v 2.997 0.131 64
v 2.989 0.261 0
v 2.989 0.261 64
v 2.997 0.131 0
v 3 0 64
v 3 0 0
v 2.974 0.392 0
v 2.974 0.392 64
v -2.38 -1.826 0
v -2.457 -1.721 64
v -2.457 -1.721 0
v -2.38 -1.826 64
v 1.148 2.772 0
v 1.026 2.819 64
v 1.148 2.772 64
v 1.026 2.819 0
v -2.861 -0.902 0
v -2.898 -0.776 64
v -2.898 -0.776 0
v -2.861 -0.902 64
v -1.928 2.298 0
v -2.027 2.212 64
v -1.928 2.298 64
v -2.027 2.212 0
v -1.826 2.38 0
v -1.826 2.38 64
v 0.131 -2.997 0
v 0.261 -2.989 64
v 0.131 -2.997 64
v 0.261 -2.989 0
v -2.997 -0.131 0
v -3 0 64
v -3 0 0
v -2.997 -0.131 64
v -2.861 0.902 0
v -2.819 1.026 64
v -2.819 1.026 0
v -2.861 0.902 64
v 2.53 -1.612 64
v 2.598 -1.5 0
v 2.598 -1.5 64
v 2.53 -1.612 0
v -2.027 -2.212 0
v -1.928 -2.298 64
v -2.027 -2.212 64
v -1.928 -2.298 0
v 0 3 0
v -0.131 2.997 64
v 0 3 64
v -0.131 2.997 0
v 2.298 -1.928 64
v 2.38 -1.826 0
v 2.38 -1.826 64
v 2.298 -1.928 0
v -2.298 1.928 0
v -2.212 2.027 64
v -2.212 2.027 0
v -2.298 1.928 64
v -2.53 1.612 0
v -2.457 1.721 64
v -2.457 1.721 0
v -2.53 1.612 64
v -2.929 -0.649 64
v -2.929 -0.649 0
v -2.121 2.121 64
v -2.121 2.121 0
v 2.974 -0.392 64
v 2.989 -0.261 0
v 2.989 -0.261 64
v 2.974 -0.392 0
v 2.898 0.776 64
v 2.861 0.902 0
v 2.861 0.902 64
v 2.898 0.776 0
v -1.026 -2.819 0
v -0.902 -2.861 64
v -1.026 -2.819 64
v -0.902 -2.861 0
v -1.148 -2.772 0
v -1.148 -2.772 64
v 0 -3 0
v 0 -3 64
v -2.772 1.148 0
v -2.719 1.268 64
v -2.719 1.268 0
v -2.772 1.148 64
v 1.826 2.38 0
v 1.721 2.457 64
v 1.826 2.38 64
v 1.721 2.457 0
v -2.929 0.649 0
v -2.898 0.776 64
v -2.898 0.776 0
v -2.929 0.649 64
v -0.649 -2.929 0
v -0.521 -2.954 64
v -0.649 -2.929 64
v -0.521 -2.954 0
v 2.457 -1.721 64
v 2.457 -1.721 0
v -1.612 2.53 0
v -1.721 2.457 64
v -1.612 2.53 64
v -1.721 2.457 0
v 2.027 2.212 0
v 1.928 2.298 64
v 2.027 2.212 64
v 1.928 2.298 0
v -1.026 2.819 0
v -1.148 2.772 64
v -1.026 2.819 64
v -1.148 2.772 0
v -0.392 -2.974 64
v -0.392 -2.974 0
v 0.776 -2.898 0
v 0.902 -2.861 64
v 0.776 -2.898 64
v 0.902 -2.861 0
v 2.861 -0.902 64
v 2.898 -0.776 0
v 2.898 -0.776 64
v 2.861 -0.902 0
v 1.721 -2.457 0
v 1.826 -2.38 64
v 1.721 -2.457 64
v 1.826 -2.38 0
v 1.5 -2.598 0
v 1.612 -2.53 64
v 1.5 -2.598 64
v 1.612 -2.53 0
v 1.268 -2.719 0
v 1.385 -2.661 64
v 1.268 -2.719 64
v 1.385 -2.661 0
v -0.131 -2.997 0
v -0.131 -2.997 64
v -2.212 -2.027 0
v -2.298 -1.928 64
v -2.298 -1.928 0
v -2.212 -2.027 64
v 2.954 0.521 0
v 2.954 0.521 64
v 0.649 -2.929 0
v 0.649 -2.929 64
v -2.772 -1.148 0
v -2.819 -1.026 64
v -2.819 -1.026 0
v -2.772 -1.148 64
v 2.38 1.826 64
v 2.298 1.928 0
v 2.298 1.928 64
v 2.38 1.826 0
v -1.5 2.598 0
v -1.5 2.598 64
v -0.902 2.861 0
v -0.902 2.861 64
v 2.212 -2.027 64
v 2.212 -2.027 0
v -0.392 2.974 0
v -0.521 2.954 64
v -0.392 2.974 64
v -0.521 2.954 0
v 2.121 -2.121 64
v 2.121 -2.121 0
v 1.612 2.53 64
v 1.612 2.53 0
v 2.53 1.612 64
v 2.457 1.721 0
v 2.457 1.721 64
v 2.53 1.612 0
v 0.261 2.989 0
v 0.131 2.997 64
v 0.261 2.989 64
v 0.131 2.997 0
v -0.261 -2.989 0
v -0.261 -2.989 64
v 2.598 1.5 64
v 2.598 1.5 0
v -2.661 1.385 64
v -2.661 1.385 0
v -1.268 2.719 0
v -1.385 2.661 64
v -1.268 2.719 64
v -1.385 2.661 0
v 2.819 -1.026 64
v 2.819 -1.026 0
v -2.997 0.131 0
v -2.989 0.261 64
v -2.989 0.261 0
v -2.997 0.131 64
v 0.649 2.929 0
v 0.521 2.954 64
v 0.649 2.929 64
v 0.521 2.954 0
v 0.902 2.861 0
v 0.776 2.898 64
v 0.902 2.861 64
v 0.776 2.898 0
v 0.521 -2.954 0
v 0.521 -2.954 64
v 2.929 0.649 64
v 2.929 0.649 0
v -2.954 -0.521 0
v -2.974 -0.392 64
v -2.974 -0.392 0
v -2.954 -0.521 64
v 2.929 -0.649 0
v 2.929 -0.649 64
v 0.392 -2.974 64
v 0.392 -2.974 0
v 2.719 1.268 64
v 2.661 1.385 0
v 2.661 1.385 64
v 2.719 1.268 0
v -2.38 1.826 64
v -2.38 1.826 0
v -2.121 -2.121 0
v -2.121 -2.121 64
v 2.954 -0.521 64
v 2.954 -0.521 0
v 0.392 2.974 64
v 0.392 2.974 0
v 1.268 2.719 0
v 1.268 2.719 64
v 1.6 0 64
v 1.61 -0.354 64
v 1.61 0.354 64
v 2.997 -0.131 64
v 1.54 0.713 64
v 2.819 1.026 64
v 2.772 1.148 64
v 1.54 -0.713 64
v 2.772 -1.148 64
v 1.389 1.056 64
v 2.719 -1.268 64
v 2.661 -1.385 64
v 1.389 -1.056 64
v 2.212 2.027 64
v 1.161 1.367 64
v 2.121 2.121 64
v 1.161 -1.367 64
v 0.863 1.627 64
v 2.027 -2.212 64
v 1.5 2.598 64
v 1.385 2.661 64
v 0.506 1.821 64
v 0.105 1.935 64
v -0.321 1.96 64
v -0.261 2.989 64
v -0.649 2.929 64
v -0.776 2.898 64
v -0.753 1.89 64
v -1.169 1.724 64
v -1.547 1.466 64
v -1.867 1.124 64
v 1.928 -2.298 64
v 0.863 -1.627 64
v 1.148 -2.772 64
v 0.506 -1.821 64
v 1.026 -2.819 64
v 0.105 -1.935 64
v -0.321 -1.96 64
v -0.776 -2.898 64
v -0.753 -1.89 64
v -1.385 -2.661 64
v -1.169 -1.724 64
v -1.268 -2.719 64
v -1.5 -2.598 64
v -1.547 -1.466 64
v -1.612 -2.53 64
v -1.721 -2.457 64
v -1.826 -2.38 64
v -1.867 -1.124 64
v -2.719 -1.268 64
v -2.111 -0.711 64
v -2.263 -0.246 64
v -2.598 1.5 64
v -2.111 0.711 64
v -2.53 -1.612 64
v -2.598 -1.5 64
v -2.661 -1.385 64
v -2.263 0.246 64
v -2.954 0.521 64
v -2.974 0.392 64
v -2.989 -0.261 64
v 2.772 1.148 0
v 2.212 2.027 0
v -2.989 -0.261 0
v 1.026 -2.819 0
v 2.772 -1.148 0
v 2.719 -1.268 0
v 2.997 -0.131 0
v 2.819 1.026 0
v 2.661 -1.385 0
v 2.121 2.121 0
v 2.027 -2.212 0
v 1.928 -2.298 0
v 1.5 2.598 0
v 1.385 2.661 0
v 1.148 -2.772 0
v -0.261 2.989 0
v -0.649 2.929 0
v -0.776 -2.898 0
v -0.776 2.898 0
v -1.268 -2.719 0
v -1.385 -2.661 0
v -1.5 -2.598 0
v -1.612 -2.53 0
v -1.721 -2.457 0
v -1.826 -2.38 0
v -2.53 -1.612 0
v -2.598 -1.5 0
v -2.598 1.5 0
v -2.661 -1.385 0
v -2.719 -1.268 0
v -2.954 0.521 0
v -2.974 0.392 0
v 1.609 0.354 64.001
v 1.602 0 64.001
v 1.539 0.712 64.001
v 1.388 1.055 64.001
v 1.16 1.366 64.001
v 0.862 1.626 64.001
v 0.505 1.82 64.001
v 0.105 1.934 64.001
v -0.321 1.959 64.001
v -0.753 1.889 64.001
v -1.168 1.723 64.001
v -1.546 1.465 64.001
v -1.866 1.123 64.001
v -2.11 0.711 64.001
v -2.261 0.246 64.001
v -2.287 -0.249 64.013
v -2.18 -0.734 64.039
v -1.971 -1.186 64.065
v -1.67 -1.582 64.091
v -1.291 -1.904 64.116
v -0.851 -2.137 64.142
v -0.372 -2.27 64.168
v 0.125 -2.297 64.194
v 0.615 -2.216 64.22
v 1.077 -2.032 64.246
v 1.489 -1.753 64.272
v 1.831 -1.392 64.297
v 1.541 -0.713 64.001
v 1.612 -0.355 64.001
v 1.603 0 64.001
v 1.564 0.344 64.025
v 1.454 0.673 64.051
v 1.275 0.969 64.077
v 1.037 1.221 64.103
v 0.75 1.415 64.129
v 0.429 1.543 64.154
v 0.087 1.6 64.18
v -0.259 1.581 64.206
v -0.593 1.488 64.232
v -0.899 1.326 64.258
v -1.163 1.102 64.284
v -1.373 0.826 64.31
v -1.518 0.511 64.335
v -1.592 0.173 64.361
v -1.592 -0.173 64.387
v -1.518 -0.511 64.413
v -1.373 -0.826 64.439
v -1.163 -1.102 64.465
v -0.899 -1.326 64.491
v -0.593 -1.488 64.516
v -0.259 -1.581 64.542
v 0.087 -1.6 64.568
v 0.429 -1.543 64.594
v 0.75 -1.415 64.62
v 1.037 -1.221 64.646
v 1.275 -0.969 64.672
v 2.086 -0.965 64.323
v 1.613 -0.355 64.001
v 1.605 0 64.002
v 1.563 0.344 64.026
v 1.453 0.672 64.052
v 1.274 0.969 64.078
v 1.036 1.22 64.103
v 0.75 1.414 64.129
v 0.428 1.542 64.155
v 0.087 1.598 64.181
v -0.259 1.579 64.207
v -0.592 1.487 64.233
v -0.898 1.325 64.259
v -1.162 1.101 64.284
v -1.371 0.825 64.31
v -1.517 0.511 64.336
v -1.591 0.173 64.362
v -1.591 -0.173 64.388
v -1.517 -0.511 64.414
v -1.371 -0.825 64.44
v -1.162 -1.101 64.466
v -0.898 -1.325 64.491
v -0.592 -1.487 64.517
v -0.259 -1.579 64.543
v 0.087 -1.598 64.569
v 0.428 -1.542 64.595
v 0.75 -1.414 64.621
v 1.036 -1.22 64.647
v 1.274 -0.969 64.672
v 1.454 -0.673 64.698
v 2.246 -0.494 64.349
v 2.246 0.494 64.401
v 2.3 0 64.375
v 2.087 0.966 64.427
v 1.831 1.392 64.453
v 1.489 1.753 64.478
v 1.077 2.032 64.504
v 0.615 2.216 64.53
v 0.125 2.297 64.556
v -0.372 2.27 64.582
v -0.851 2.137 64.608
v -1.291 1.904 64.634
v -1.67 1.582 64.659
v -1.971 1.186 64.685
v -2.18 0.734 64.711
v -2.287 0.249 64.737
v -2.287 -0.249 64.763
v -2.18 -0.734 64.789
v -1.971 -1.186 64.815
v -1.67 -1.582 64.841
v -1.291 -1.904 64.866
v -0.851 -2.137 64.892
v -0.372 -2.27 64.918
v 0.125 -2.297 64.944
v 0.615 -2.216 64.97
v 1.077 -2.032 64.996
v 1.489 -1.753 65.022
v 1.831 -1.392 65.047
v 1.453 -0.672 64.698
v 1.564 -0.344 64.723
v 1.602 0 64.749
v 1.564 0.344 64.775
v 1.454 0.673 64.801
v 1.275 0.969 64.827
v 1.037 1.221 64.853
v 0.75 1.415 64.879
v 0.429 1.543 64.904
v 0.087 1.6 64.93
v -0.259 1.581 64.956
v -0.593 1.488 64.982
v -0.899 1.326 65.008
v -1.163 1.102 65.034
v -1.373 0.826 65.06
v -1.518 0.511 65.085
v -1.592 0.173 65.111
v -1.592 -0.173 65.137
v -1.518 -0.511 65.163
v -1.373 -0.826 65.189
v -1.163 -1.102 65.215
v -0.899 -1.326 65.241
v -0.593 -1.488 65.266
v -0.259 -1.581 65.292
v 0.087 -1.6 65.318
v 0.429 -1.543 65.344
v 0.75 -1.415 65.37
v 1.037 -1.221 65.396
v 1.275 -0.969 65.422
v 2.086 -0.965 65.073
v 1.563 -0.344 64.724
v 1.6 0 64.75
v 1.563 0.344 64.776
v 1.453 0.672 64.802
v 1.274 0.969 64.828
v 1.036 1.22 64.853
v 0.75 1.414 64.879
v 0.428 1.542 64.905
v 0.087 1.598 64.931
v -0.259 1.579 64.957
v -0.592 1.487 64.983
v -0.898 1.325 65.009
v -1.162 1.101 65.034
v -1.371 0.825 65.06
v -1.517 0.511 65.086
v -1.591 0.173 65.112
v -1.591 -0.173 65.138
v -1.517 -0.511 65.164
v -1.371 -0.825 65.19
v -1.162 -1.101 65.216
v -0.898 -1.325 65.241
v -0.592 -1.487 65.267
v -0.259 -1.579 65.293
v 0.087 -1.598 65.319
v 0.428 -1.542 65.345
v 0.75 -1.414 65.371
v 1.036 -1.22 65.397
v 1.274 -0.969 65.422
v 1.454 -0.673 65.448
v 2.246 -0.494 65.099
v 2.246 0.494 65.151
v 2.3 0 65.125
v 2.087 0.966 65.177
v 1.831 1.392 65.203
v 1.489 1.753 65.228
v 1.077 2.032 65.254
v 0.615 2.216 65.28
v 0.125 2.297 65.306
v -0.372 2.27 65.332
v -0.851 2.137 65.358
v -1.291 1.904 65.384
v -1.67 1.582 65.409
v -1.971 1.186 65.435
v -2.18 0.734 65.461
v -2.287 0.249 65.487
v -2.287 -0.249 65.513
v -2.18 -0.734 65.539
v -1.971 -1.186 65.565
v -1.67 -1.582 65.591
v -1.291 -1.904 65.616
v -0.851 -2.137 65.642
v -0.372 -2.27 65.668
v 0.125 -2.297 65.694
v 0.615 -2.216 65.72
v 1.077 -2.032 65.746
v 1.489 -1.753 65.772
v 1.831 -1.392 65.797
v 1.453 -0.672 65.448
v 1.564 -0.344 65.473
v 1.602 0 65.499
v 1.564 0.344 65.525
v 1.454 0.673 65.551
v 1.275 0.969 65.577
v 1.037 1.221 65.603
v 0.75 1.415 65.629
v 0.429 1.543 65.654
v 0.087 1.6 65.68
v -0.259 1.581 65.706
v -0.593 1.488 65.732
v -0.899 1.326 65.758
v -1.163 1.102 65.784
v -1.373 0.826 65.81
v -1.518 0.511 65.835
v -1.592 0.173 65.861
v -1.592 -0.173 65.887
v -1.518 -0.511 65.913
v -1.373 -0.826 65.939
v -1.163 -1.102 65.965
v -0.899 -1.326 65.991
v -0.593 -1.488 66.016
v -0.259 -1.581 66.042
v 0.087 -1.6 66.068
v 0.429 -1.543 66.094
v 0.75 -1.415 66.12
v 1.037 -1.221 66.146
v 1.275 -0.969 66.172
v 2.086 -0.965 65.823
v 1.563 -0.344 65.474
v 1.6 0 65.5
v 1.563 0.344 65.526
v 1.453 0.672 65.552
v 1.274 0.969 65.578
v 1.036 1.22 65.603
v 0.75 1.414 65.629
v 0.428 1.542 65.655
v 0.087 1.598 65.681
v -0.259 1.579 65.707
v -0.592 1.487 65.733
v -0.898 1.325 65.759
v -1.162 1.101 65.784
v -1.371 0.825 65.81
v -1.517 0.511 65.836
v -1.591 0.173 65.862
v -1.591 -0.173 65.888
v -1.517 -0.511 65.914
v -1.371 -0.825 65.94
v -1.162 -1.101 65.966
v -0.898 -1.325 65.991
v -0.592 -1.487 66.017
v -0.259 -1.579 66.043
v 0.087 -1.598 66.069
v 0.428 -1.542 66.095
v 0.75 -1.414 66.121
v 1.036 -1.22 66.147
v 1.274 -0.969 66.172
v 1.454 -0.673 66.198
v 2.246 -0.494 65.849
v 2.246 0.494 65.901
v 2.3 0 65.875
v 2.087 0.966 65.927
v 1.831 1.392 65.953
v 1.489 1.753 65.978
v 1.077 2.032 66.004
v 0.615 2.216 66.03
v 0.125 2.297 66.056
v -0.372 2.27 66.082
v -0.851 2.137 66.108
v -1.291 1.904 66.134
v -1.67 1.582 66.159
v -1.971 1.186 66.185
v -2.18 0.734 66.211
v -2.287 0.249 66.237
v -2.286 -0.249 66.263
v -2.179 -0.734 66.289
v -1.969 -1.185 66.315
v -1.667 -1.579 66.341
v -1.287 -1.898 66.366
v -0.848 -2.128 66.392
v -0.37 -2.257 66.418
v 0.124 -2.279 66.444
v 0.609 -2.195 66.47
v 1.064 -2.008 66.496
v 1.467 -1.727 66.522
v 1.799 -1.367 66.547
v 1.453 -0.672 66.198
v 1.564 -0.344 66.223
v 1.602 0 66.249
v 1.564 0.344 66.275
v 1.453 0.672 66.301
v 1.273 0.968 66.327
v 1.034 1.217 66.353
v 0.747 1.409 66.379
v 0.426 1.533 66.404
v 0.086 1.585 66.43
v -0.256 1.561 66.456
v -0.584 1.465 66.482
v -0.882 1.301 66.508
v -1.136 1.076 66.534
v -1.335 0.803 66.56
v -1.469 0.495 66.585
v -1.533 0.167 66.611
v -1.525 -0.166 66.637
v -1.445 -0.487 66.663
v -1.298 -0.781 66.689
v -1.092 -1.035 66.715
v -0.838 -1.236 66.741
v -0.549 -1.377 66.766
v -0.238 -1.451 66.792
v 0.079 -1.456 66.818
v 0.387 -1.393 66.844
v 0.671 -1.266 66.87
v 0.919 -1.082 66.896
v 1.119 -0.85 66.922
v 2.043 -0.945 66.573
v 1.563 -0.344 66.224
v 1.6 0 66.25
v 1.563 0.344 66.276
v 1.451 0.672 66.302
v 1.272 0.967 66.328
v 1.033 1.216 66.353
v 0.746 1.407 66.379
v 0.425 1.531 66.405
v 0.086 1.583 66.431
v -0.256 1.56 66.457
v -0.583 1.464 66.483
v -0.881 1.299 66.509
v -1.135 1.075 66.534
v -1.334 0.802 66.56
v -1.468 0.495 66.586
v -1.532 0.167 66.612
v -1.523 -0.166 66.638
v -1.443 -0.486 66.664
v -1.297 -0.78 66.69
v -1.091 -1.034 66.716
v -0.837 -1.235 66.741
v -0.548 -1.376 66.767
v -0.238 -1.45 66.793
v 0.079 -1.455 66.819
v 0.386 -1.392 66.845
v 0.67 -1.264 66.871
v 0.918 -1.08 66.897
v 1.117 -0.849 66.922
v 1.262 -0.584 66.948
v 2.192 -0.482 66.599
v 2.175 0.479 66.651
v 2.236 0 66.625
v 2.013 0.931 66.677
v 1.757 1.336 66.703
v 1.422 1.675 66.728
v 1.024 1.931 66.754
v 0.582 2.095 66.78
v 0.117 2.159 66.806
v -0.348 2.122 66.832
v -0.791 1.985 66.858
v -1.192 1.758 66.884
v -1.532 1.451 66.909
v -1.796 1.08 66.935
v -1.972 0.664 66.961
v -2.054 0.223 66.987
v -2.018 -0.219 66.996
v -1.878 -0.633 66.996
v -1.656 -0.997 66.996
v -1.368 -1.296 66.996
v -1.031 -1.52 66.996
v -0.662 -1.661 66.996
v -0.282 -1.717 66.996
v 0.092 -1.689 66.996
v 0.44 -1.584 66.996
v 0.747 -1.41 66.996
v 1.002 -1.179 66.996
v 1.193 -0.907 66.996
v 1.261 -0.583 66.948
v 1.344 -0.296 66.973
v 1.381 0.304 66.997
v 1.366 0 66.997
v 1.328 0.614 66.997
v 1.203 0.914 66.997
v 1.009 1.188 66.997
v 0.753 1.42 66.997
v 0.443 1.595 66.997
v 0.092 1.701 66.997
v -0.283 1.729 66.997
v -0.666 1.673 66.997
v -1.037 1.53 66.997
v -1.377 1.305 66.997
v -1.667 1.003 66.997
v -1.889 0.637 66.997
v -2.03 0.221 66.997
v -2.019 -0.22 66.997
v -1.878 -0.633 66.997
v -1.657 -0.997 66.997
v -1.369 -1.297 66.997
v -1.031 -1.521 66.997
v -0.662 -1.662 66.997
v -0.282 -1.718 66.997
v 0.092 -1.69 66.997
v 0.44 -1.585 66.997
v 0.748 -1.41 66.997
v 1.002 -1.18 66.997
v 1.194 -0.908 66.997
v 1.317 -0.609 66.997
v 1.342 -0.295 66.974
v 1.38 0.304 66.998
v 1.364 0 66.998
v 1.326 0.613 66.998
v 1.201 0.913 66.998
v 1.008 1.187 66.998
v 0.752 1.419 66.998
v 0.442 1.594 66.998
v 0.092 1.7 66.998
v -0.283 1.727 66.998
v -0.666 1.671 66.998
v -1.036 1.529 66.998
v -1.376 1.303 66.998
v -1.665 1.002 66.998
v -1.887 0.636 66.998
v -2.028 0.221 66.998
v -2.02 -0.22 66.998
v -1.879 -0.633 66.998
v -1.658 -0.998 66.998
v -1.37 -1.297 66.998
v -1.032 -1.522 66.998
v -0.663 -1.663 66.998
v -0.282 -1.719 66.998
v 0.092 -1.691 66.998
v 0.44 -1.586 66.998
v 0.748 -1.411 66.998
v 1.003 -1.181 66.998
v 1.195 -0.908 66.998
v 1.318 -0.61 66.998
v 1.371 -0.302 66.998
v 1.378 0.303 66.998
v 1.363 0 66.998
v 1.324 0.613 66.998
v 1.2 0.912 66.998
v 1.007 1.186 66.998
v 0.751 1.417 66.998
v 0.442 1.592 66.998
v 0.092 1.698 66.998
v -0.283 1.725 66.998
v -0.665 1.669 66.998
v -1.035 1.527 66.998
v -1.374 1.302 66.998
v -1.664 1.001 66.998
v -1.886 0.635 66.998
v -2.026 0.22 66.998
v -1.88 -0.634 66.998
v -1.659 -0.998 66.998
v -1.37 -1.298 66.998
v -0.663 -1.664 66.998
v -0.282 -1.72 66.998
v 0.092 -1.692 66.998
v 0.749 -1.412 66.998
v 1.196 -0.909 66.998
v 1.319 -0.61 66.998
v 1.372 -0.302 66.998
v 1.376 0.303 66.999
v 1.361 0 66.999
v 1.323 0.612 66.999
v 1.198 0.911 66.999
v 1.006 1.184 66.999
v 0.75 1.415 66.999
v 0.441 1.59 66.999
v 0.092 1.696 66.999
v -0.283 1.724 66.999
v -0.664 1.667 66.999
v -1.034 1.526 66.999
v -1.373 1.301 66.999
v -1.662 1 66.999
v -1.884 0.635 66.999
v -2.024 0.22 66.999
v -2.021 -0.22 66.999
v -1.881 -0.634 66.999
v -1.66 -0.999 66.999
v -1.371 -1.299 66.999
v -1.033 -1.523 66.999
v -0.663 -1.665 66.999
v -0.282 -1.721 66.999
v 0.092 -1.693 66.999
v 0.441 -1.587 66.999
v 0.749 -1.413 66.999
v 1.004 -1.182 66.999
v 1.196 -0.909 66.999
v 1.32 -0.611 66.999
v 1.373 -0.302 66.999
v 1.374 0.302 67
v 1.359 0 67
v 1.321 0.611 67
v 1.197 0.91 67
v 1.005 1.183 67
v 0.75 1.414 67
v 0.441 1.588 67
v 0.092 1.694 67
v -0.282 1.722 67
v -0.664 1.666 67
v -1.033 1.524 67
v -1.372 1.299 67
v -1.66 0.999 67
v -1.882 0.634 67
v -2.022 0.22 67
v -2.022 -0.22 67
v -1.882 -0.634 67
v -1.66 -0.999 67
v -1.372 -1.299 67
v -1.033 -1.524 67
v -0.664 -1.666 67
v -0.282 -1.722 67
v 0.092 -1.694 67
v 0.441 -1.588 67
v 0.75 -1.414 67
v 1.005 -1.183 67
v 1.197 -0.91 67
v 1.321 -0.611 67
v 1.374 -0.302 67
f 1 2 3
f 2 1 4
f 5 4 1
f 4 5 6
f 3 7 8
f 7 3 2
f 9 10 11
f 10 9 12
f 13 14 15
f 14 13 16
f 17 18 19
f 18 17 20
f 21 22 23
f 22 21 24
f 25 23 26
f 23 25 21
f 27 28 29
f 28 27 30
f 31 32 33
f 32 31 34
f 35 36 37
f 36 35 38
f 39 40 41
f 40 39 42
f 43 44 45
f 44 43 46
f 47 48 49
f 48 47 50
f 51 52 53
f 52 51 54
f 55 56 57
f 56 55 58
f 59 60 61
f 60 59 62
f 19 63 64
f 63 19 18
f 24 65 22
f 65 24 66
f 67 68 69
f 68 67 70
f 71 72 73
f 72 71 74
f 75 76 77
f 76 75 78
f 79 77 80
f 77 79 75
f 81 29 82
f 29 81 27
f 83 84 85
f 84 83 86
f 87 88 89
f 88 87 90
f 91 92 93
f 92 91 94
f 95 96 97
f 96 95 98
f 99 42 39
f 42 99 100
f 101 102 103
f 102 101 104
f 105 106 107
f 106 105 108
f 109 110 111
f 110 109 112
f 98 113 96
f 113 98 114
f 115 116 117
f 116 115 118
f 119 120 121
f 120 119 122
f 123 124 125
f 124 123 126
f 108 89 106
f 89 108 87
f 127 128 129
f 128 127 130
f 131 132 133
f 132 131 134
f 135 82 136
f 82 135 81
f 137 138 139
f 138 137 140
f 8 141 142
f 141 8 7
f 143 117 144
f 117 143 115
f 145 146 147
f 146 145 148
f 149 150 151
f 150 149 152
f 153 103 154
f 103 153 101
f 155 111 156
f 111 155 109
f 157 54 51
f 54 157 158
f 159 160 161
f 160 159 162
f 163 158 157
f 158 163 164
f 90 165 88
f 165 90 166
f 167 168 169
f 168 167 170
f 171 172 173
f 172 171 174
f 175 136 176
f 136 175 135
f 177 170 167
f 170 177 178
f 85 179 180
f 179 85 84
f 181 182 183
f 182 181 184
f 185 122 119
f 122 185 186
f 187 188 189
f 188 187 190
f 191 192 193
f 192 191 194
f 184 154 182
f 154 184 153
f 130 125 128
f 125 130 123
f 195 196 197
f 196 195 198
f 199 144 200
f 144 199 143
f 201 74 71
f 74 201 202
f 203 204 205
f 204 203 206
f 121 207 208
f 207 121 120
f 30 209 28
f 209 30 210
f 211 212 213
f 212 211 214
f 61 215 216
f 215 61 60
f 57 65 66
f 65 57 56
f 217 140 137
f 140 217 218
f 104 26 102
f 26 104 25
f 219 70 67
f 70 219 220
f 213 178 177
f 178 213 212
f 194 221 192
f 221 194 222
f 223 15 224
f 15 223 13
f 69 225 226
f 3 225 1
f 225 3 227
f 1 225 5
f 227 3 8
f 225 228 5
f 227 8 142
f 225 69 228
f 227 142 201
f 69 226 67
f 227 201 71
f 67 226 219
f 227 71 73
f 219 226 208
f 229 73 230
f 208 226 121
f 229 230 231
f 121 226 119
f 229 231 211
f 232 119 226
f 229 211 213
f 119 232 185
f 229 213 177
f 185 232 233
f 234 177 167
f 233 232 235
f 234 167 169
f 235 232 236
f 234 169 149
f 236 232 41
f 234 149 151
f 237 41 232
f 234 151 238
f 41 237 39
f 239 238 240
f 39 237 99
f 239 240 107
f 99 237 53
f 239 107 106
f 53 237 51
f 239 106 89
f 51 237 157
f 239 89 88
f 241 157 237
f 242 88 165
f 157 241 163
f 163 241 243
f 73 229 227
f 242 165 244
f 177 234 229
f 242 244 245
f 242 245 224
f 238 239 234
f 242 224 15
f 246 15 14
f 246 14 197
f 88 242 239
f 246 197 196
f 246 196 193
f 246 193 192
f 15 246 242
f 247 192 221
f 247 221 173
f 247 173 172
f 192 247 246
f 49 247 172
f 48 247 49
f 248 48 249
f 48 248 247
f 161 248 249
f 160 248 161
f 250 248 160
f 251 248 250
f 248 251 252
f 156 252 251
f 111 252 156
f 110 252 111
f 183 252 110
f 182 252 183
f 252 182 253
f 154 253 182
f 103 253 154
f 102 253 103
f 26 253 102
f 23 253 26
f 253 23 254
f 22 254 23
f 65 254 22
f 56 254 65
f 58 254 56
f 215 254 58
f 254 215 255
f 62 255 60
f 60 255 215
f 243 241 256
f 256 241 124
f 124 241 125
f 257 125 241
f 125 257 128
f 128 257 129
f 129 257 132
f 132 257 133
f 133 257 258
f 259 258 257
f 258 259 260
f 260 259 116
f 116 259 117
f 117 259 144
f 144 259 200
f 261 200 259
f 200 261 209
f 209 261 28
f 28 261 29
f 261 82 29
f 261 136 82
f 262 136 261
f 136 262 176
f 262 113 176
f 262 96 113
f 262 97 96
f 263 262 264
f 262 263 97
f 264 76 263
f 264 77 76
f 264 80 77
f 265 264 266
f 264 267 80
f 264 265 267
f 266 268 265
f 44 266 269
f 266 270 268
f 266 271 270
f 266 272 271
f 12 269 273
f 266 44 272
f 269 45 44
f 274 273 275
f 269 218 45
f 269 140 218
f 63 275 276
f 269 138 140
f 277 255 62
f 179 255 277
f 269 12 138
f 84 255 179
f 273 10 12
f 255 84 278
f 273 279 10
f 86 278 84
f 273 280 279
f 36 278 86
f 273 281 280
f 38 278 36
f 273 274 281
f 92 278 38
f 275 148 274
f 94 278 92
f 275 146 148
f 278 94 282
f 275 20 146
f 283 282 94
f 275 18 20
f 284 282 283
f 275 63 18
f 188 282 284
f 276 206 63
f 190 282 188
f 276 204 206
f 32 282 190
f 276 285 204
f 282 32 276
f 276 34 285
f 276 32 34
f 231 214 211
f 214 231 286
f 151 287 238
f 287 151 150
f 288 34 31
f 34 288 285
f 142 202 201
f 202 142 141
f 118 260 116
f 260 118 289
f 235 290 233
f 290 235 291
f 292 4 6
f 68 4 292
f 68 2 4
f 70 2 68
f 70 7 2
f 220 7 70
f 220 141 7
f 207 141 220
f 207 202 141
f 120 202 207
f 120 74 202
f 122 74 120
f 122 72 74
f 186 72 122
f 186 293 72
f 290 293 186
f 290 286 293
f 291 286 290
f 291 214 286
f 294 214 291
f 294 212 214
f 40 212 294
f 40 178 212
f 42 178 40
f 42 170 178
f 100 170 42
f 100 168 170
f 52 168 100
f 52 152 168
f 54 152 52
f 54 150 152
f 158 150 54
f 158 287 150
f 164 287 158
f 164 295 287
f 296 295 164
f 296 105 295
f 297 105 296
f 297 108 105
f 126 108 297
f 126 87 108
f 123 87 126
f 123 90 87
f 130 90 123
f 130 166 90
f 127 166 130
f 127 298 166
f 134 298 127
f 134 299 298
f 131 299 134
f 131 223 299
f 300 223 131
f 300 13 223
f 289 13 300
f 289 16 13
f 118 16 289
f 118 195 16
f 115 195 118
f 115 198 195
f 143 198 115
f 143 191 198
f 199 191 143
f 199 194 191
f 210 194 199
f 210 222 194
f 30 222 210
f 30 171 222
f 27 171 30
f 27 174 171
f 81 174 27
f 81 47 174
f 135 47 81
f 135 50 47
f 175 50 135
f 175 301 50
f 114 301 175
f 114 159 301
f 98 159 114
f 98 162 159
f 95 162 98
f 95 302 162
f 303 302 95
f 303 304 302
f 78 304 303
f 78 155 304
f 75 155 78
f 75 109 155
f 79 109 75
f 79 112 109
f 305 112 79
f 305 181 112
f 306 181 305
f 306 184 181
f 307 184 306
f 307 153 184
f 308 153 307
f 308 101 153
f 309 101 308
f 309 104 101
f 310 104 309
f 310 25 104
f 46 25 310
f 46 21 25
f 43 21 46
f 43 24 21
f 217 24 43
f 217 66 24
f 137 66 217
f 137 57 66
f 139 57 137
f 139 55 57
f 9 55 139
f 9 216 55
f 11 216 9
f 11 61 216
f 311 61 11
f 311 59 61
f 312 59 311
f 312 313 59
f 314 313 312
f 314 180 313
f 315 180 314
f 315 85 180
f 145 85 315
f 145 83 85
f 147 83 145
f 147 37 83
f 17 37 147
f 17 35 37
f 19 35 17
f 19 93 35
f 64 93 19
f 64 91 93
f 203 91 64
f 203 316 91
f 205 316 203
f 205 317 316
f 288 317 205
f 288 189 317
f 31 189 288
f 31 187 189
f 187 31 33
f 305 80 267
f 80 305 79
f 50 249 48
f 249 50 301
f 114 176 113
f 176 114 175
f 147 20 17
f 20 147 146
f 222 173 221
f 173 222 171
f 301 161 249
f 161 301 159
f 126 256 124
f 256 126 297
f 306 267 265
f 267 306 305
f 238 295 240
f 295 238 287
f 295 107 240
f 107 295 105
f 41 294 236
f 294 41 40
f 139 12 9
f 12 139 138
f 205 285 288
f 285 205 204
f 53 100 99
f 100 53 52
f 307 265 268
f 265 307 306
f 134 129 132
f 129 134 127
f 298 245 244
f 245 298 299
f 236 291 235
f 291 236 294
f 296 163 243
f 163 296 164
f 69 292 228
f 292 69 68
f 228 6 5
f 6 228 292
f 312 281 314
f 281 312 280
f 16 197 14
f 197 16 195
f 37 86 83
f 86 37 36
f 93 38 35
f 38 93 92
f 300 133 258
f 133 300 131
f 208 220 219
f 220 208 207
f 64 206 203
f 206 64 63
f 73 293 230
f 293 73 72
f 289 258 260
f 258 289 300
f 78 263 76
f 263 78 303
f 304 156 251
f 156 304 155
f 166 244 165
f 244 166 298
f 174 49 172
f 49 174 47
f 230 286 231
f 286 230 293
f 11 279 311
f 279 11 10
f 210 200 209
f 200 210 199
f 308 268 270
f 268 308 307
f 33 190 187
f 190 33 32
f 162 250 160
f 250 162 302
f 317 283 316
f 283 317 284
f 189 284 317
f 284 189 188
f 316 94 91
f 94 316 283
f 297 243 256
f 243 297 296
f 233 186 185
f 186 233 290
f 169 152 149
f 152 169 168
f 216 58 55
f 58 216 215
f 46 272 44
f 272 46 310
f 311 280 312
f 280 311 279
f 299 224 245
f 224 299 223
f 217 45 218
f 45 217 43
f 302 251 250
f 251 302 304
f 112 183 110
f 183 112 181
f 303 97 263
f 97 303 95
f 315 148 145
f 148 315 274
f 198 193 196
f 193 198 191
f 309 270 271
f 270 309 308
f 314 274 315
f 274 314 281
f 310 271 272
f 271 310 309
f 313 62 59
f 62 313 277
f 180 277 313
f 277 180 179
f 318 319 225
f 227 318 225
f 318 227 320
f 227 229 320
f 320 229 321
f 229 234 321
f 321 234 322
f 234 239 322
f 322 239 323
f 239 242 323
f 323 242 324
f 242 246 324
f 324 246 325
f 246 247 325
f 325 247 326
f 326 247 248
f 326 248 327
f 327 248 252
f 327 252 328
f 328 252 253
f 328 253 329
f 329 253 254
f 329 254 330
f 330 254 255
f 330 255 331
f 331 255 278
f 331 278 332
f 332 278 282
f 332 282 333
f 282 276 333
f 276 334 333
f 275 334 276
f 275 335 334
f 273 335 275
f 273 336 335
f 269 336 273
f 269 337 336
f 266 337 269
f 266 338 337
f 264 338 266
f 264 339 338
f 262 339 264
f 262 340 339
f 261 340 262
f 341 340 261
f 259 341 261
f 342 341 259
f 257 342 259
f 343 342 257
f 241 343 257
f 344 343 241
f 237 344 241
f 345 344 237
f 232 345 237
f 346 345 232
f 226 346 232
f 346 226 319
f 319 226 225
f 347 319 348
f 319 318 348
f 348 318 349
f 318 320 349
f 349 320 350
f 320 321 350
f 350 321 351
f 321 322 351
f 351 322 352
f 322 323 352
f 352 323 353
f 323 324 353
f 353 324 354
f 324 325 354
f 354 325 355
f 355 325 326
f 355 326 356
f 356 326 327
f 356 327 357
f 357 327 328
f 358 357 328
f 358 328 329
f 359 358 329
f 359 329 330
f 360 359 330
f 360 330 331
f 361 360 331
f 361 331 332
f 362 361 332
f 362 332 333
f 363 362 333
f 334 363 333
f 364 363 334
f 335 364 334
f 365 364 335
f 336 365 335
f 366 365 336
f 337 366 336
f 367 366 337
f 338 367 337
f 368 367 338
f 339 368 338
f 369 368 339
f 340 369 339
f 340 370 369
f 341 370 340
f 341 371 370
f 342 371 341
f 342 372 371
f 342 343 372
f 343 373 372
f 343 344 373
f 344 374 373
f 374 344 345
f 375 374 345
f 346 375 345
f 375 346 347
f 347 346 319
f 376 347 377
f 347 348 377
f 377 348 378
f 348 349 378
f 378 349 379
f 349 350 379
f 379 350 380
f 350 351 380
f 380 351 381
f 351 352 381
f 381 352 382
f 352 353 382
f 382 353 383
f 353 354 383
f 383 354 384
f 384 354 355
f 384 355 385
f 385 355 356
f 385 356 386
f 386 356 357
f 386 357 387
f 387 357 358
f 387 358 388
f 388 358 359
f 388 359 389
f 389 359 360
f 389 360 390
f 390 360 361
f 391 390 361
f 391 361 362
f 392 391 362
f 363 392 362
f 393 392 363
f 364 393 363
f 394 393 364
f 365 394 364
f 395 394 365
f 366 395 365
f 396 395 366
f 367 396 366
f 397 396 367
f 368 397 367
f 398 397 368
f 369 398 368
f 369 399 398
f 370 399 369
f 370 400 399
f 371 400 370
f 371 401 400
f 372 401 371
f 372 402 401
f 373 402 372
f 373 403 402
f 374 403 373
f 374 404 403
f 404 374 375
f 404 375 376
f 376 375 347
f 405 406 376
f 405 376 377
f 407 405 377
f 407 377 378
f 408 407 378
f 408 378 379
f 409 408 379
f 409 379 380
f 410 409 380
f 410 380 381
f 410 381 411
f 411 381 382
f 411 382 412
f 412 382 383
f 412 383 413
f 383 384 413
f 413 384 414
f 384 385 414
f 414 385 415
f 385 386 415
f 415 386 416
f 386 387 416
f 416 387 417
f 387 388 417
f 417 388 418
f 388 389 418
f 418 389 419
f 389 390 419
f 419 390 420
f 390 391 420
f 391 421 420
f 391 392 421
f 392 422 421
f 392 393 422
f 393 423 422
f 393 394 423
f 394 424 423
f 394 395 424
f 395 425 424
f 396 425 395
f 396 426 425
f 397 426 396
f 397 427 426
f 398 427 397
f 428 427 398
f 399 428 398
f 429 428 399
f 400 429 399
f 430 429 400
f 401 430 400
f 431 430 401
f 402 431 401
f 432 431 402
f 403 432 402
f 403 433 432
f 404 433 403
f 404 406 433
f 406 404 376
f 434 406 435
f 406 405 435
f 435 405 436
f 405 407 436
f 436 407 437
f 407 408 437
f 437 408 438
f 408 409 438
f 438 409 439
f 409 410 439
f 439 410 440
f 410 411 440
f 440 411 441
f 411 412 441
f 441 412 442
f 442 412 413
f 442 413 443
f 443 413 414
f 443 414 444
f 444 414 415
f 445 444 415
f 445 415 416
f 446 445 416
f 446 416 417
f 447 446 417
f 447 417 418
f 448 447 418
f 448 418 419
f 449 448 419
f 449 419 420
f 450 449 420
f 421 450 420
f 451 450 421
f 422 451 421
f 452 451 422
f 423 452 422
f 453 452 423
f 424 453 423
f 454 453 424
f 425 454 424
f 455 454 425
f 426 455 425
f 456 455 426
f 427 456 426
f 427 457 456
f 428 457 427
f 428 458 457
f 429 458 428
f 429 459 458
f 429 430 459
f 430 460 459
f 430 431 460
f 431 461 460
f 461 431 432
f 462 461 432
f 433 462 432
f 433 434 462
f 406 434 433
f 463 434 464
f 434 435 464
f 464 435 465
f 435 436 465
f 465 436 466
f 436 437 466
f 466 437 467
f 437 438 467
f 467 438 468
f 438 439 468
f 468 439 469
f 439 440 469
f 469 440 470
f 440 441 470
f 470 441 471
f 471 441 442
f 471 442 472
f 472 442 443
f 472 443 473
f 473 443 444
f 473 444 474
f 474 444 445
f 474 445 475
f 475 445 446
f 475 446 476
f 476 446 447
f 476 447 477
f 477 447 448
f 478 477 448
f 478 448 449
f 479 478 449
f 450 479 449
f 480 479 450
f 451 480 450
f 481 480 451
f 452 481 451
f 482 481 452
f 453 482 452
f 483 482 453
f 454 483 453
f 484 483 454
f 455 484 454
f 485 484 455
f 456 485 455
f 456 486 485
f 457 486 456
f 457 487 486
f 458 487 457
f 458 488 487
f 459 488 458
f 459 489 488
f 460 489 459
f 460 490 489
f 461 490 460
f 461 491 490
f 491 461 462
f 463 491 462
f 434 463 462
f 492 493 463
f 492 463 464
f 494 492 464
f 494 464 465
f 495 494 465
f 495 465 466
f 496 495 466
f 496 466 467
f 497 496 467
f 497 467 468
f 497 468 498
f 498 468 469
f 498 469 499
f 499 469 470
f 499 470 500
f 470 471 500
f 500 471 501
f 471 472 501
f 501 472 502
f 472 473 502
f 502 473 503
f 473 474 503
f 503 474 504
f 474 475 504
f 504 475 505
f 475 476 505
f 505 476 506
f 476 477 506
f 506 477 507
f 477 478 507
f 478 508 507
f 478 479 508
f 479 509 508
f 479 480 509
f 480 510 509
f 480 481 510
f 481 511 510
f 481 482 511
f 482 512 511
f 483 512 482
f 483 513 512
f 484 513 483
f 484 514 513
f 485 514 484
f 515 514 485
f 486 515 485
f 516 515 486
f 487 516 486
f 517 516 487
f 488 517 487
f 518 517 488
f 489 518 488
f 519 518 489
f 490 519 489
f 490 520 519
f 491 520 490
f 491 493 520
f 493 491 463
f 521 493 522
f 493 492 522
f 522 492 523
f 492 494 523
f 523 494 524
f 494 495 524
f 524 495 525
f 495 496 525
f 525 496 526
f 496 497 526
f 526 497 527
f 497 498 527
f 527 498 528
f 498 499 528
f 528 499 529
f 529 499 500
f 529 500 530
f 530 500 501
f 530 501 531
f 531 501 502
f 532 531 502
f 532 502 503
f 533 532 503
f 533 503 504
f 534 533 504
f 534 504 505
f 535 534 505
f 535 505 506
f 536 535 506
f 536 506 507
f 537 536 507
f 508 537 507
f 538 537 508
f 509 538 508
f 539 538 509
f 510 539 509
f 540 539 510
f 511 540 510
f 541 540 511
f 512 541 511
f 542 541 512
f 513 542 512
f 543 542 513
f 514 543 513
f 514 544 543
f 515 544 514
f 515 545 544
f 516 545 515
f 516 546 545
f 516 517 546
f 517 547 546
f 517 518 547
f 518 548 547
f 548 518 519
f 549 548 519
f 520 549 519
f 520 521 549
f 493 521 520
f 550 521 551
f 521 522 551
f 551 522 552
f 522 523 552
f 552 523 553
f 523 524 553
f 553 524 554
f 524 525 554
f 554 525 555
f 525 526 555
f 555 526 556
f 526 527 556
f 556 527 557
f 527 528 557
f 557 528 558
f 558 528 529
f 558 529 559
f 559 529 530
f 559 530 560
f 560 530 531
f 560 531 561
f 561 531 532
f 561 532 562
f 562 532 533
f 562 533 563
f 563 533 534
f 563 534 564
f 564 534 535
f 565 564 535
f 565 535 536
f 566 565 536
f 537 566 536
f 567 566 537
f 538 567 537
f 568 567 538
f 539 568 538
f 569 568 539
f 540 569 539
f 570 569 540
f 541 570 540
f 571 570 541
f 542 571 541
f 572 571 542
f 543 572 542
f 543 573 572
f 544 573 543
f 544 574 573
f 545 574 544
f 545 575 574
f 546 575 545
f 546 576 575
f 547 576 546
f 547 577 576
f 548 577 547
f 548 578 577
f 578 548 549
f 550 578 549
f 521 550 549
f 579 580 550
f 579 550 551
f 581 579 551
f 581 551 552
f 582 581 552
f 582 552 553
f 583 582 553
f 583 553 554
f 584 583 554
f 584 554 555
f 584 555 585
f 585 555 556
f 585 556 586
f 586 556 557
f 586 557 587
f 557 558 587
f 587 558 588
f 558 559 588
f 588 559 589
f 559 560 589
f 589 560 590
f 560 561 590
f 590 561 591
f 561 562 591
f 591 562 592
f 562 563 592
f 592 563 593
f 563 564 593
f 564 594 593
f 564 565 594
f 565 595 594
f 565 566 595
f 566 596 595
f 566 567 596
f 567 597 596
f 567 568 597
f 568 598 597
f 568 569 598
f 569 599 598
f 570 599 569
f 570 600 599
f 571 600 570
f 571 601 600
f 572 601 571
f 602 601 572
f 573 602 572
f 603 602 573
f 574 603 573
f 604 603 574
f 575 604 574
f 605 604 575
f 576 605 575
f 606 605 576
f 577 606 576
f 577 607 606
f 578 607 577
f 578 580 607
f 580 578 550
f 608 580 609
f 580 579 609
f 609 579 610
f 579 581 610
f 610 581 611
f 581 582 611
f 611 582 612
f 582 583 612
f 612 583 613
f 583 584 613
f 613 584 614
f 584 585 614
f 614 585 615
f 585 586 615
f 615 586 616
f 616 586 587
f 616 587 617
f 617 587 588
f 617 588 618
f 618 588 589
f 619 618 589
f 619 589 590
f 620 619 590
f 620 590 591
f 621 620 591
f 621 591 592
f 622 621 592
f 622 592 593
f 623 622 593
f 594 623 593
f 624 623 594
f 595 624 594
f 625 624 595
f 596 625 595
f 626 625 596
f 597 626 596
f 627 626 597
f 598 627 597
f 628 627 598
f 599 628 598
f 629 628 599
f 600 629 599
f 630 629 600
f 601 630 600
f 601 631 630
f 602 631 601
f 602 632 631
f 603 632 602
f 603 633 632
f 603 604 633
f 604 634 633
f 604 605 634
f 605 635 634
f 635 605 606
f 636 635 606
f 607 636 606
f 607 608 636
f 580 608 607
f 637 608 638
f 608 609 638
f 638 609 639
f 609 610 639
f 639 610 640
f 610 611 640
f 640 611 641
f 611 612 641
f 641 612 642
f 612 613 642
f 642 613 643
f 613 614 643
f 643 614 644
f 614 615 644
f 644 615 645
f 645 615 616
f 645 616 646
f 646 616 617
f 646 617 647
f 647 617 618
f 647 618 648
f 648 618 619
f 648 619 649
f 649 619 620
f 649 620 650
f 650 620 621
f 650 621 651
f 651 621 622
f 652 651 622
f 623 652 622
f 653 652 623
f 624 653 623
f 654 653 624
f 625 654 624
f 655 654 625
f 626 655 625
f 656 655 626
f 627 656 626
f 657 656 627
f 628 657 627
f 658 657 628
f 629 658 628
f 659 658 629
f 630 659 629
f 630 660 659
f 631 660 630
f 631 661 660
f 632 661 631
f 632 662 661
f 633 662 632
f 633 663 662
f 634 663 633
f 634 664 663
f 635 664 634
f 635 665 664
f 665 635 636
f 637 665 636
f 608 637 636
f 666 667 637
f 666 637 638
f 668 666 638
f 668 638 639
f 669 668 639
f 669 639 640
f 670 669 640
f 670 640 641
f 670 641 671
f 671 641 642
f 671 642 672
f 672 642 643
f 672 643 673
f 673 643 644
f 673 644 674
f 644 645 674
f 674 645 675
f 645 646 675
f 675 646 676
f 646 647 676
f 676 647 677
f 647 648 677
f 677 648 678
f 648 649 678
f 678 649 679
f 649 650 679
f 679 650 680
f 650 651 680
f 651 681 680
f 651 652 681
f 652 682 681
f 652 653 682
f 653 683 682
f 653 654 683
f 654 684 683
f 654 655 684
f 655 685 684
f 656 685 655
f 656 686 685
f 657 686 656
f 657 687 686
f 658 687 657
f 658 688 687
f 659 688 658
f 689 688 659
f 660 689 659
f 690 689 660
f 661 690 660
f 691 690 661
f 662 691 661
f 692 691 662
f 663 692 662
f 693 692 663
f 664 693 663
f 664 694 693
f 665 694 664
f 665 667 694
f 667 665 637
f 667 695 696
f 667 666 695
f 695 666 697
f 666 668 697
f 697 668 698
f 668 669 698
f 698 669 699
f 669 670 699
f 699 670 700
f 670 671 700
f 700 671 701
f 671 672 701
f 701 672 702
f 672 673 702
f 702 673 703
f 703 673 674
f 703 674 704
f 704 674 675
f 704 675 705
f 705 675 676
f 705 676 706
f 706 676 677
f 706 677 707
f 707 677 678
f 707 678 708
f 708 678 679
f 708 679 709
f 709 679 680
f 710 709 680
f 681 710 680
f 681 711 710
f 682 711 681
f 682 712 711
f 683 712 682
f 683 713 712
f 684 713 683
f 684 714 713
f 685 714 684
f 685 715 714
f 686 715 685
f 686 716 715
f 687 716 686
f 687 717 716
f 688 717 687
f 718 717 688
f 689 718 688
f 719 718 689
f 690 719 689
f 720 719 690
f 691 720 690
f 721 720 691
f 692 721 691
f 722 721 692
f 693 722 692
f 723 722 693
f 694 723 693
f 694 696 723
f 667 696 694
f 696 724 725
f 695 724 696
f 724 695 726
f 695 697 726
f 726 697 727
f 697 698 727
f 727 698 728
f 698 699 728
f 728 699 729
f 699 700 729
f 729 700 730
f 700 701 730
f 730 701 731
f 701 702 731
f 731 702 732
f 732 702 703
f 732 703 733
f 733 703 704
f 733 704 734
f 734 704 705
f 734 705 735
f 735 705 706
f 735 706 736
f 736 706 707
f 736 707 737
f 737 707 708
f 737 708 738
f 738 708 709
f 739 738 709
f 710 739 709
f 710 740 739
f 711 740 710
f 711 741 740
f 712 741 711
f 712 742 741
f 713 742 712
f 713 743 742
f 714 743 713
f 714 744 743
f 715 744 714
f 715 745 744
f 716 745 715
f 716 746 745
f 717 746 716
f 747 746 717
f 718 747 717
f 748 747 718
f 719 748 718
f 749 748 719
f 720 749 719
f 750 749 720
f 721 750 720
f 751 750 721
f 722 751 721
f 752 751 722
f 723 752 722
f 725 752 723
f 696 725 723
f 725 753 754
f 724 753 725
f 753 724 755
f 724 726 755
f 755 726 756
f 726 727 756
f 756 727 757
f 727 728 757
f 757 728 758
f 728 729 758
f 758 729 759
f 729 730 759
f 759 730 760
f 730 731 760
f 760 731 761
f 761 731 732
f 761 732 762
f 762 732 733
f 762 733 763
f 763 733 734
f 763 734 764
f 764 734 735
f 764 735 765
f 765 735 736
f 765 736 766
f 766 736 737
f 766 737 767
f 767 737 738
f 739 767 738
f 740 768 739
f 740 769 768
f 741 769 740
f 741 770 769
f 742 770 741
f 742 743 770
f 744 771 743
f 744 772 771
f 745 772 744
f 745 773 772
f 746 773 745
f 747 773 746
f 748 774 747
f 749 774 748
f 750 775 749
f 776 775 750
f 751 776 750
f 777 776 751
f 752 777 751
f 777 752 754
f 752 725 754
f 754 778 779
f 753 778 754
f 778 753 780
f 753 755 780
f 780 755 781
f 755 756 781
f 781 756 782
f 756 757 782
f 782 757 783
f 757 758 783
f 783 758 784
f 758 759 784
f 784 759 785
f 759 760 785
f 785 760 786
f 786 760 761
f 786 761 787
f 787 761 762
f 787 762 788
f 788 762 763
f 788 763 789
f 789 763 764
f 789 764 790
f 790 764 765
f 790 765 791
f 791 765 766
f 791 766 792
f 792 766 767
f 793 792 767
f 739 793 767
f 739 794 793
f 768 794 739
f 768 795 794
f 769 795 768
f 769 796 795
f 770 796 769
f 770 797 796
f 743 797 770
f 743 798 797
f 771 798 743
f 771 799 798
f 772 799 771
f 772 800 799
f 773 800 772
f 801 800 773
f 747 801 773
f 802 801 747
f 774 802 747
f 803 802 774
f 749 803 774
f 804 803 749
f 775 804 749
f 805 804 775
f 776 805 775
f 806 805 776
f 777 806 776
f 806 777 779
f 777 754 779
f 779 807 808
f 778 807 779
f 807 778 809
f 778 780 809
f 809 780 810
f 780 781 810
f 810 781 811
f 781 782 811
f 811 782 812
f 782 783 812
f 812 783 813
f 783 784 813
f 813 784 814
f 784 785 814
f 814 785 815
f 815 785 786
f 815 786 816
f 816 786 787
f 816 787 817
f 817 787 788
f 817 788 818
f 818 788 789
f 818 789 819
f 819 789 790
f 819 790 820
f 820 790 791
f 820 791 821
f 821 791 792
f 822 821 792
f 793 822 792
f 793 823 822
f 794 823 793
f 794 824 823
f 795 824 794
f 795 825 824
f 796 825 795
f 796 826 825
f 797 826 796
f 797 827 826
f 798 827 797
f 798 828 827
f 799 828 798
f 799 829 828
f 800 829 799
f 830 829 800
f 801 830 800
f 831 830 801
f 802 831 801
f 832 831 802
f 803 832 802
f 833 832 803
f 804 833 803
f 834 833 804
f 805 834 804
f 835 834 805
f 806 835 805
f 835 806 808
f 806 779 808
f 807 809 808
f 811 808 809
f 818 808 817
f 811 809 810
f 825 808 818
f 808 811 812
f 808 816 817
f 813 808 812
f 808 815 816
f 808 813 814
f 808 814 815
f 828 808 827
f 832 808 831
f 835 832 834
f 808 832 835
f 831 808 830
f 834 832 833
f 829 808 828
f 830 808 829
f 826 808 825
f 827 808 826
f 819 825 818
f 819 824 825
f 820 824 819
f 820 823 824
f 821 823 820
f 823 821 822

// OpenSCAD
// Created 2016-2017 by Ryan A. Colyer.
// This work is released with CC0 into the public domain.
// https://creativecommons.org/publicdomain/zero/1.0/
//
// https://www.thingiverse.com/thing:1686322
//
// v2.1

$fn = 100;

screw_resolution = 0.5;  // in mm

// Legs
leg_diameter = 6;
leg_height = 64;

// Provides standard metric thread pitches.
function ThreadPitch(diameter) =
  (diameter <= 64) ?
    lookup(diameter, [
      [2, 0.4],
      [2.5, 0.45],
      [3, 0.5],
      [4, 0.7],
      [5, 0.8],
      [6, 1.0],
      [7, 1.0],
      [8, 1.25],
      [10, 1.5],
      [12, 1.75],
      [14, 2.0],
      [16, 2.0],
      [18, 2.5],
      [20, 2.5],
      [22, 2.5],
      [24, 3.0],
      [27, 3.0],
      [30, 3.5],
      [33, 3.5],
      [36, 4.0],
      [39, 4.0],
      [42, 4.5],
      [48, 5.0],
      [52, 5.0],
      [56, 5.5],
      [60, 5.5],
      [64, 6.0]
    ]) :
    diameter * 6.0 / 64;


// This generates a closed polyhedron from an array of arrays of points,
// with each inner array tracing out one loop outlining the polyhedron.
// pointarrays should contain an array of N arrays each of size P outlining a
// closed manifold.  The points must obey the right-hand rule.  For example,
// looking down, the P points in the inner arrays are counter-clockwise in a
// loop, while the N point arrays increase in height.  Points in each inner
// array do not need to be equal height, but they usually should not meet or
// cross the line segments from the adjacent points in the other arrays.
// (N>=2, P>=3)
// Core triangles:
//   [j][i], [j+1][i], [j+1][(i+1)%P]
//   [j][i], [j+1][(i+1)%P], [j][(i+1)%P]
//   Then triangles are formed in a loop with the middle point of the first
//   and last array.
module ClosePoints(pointarrays) {
  function recurse_avg(arr, n=0, p=[0,0,0]) = (n>=len(arr)) ? p :
    recurse_avg(arr, n+1, p+(arr[n]-p)/(n+1));

  N = len(pointarrays);
  P = len(pointarrays[0]);
  NP = N*P;
  lastarr = pointarrays[N-1];
  midbot = recurse_avg(pointarrays[0]);
  midtop = recurse_avg(pointarrays[N-1]);

  faces_bot = [
    for (i=[0:P-1])
      [0,i+1,1+(i+1)%len(pointarrays[0])]
  ];

  loop_offset = 1;
  bot_len = loop_offset + P;

  faces_loop = [
    for (j=[0:N-2], i=[0:P-1], t=[0:1])
      [loop_offset, loop_offset, loop_offset] + (t==0 ?
      [j*P+i, (j+1)*P+i, (j+1)*P+(i+1)%P] :
      [j*P+i, (j+1)*P+(i+1)%P, j*P+(i+1)%P])
  ];

  top_offset = loop_offset + NP - P;
  midtop_offset = top_offset + P;

  faces_top = [
    for (i=[0:P-1])
      [midtop_offset,top_offset+(i+1)%P,top_offset+i]
  ];

  points = [
    for (i=[-1:NP])
      (i<0) ? midbot :
      ((i==NP) ? midtop :
      pointarrays[floor(i/P)][i%P])
  ];
  faces = concat(faces_bot, faces_loop, faces_top);

  polyhedron(points=points, faces=faces);
}

// This creates a vertical rod at the origin with external threads.  It uses
// metric standards by default.
module ScrewThread(outer_diam, height, pitch=0, tooth_angle=30, tolerance=0.4, tip_height=0, tooth_height=0, tip_min_fract=0) {

  pitch = (pitch==0) ? ThreadPitch(outer_diam) : pitch;
  tooth_height = (tooth_height==0) ? pitch : tooth_height;
  tip_min_fract = (tip_min_fract<0) ? 0 :
    ((tip_min_fract>0.9999) ? 0.9999 : tip_min_fract);

  outer_diam_cor = outer_diam + 0.25*tolerance; // Plastic shrinkage correction
  inner_diam = outer_diam - tooth_height/tan(tooth_angle);
  or = (outer_diam_cor < screw_resolution) ?
    screw_resolution/2 : outer_diam_cor / 2;
  ir = (inner_diam < screw_resolution) ? screw_resolution/2 : inner_diam / 2;
  height = (height < screw_resolution) ? screw_resolution : height;

  steps_per_loop_try = ceil(2*3.14159265359*or / screw_resolution);
  steps_per_loop = (steps_per_loop_try < 4) ? 4 : steps_per_loop_try;
  hs_ext = 3;
  hsteps = ceil(3 * height / pitch) + 2*hs_ext;

  extent = or - ir;

  tip_start = height-tip_height;
  tip_height_sc = tip_height / (1-tip_min_fract);

  tip_height_ir = (tip_height_sc > tooth_height/2) ?
    tip_height_sc - tooth_height/2 : tip_height_sc;

  tip_height_w = (tip_height_sc > tooth_height) ? tooth_height : tip_height_sc;
  tip_wstart = height + tip_height_sc - tip_height - tip_height_w;


  function tooth_width(a, h, pitch, tooth_height, extent) =
    let(
      ang_full = h*360.0/pitch-a,
      ang_pn = atan2(sin(ang_full), cos(ang_full)),
      ang = ang_pn < 0 ? ang_pn+360 : ang_pn,
      frac = ang/360,
      tfrac_half = tooth_height / (2*pitch),
      tfrac_cut = 2*tfrac_half
    )
    (frac > tfrac_cut) ? 0 : (
      (frac <= tfrac_half) ?
        ((frac / tfrac_half) * extent) :
        ((1 - (frac - tfrac_half)/tfrac_half) * extent)
    );


  pointarrays = [
    for (hs=[0:hsteps])
      [
        for (s=[0:steps_per_loop-1])
          let(
            ang_full = s*360.0/steps_per_loop,
            ang_pn = atan2(sin(ang_full), cos(ang_full)),
            ang = ang_pn < 0 ? ang_pn+360 : ang_pn,

            h_fudge = pitch*0.001,

            h_mod =
              (hs%3 == 2) ?
                ((s == steps_per_loop-1) ? tooth_height - h_fudge : (
                 (s == steps_per_loop-2) ? tooth_height/2 : 0)) : (
              (hs%3 == 0) ?
                ((s == steps_per_loop-1) ? pitch-tooth_height/2 : (
                 (s == steps_per_loop-2) ? pitch-tooth_height + h_fudge : 0)) :
                ((s == steps_per_loop-1) ? pitch-tooth_height/2 + h_fudge : (
                 (s == steps_per_loop-2) ? tooth_height/2 : 0))
              ),

            h_level =
              (hs%3 == 2) ? tooth_height - h_fudge : (
              (hs%3 == 0) ? 0 : tooth_height/2),

            h_ub = floor((hs-hs_ext)/3) * pitch
              + h_level + ang*pitch/360.0 - h_mod,
            h_max = height - (hsteps-hs) * h_fudge,
            h_min = hs * h_fudge,
            h = (h_ub < h_min) ? h_min : ((h_ub > h_max) ? h_max : h_ub),

            ht = h - tip_start,
            hf_ir = ht/tip_height_ir,
            ht_w = h - tip_wstart,
            hf_w_t = ht_w/tip_height_w,
            hf_w = (hf_w_t < 0) ? 0 : ((hf_w_t > 1) ? 1 : hf_w_t),

            ext_tip = (h <= tip_wstart) ? extent : (1-hf_w) * extent,
            wnormal = tooth_width(ang, h, pitch, tooth_height, ext_tip),
            w = (h <= tip_wstart) ? wnormal :
              (1-hf_w) * wnormal +
              hf_w * (0.1*screw_resolution + (wnormal * wnormal * wnormal /
                (ext_tip*ext_tip+0.1*screw_resolution))),
            r = (ht <= 0) ? ir + w :
              ( (ht < tip_height_ir ? ((2/(1+(hf_ir*hf_ir))-1) * ir) : 0) + w)
          )
          [r*cos(ang), r*sin(ang), h]
      ]
  ];


  ClosePoints(pointarrays);
}

// Solid rod on the bottom, external threads on the top.
module RodStart(height, diameter, thread_len=0, thread_diam=0, thread_pitch=0) {
  // A reasonable default.
  thread_diam = (thread_diam==0) ? 0.75*diameter : thread_diam;
  thread_len = (thread_len==0) ? 0.5*diameter : thread_len;
  thread_pitch = (thread_pitch==0) ? ThreadPitch(thread_diam) : thread_pitch;

  cylinder(r=diameter/2, h=height, $fn=24*diameter);

  translate([0, 0, height])
    ScrewThread(thread_diam, thread_len, thread_pitch,
      tip_height=thread_pitch, tip_min_fract=0.75);
}

// Legs
module leg() {
  RodStart(leg_height, leg_diameter);
}

// Render
leg();
